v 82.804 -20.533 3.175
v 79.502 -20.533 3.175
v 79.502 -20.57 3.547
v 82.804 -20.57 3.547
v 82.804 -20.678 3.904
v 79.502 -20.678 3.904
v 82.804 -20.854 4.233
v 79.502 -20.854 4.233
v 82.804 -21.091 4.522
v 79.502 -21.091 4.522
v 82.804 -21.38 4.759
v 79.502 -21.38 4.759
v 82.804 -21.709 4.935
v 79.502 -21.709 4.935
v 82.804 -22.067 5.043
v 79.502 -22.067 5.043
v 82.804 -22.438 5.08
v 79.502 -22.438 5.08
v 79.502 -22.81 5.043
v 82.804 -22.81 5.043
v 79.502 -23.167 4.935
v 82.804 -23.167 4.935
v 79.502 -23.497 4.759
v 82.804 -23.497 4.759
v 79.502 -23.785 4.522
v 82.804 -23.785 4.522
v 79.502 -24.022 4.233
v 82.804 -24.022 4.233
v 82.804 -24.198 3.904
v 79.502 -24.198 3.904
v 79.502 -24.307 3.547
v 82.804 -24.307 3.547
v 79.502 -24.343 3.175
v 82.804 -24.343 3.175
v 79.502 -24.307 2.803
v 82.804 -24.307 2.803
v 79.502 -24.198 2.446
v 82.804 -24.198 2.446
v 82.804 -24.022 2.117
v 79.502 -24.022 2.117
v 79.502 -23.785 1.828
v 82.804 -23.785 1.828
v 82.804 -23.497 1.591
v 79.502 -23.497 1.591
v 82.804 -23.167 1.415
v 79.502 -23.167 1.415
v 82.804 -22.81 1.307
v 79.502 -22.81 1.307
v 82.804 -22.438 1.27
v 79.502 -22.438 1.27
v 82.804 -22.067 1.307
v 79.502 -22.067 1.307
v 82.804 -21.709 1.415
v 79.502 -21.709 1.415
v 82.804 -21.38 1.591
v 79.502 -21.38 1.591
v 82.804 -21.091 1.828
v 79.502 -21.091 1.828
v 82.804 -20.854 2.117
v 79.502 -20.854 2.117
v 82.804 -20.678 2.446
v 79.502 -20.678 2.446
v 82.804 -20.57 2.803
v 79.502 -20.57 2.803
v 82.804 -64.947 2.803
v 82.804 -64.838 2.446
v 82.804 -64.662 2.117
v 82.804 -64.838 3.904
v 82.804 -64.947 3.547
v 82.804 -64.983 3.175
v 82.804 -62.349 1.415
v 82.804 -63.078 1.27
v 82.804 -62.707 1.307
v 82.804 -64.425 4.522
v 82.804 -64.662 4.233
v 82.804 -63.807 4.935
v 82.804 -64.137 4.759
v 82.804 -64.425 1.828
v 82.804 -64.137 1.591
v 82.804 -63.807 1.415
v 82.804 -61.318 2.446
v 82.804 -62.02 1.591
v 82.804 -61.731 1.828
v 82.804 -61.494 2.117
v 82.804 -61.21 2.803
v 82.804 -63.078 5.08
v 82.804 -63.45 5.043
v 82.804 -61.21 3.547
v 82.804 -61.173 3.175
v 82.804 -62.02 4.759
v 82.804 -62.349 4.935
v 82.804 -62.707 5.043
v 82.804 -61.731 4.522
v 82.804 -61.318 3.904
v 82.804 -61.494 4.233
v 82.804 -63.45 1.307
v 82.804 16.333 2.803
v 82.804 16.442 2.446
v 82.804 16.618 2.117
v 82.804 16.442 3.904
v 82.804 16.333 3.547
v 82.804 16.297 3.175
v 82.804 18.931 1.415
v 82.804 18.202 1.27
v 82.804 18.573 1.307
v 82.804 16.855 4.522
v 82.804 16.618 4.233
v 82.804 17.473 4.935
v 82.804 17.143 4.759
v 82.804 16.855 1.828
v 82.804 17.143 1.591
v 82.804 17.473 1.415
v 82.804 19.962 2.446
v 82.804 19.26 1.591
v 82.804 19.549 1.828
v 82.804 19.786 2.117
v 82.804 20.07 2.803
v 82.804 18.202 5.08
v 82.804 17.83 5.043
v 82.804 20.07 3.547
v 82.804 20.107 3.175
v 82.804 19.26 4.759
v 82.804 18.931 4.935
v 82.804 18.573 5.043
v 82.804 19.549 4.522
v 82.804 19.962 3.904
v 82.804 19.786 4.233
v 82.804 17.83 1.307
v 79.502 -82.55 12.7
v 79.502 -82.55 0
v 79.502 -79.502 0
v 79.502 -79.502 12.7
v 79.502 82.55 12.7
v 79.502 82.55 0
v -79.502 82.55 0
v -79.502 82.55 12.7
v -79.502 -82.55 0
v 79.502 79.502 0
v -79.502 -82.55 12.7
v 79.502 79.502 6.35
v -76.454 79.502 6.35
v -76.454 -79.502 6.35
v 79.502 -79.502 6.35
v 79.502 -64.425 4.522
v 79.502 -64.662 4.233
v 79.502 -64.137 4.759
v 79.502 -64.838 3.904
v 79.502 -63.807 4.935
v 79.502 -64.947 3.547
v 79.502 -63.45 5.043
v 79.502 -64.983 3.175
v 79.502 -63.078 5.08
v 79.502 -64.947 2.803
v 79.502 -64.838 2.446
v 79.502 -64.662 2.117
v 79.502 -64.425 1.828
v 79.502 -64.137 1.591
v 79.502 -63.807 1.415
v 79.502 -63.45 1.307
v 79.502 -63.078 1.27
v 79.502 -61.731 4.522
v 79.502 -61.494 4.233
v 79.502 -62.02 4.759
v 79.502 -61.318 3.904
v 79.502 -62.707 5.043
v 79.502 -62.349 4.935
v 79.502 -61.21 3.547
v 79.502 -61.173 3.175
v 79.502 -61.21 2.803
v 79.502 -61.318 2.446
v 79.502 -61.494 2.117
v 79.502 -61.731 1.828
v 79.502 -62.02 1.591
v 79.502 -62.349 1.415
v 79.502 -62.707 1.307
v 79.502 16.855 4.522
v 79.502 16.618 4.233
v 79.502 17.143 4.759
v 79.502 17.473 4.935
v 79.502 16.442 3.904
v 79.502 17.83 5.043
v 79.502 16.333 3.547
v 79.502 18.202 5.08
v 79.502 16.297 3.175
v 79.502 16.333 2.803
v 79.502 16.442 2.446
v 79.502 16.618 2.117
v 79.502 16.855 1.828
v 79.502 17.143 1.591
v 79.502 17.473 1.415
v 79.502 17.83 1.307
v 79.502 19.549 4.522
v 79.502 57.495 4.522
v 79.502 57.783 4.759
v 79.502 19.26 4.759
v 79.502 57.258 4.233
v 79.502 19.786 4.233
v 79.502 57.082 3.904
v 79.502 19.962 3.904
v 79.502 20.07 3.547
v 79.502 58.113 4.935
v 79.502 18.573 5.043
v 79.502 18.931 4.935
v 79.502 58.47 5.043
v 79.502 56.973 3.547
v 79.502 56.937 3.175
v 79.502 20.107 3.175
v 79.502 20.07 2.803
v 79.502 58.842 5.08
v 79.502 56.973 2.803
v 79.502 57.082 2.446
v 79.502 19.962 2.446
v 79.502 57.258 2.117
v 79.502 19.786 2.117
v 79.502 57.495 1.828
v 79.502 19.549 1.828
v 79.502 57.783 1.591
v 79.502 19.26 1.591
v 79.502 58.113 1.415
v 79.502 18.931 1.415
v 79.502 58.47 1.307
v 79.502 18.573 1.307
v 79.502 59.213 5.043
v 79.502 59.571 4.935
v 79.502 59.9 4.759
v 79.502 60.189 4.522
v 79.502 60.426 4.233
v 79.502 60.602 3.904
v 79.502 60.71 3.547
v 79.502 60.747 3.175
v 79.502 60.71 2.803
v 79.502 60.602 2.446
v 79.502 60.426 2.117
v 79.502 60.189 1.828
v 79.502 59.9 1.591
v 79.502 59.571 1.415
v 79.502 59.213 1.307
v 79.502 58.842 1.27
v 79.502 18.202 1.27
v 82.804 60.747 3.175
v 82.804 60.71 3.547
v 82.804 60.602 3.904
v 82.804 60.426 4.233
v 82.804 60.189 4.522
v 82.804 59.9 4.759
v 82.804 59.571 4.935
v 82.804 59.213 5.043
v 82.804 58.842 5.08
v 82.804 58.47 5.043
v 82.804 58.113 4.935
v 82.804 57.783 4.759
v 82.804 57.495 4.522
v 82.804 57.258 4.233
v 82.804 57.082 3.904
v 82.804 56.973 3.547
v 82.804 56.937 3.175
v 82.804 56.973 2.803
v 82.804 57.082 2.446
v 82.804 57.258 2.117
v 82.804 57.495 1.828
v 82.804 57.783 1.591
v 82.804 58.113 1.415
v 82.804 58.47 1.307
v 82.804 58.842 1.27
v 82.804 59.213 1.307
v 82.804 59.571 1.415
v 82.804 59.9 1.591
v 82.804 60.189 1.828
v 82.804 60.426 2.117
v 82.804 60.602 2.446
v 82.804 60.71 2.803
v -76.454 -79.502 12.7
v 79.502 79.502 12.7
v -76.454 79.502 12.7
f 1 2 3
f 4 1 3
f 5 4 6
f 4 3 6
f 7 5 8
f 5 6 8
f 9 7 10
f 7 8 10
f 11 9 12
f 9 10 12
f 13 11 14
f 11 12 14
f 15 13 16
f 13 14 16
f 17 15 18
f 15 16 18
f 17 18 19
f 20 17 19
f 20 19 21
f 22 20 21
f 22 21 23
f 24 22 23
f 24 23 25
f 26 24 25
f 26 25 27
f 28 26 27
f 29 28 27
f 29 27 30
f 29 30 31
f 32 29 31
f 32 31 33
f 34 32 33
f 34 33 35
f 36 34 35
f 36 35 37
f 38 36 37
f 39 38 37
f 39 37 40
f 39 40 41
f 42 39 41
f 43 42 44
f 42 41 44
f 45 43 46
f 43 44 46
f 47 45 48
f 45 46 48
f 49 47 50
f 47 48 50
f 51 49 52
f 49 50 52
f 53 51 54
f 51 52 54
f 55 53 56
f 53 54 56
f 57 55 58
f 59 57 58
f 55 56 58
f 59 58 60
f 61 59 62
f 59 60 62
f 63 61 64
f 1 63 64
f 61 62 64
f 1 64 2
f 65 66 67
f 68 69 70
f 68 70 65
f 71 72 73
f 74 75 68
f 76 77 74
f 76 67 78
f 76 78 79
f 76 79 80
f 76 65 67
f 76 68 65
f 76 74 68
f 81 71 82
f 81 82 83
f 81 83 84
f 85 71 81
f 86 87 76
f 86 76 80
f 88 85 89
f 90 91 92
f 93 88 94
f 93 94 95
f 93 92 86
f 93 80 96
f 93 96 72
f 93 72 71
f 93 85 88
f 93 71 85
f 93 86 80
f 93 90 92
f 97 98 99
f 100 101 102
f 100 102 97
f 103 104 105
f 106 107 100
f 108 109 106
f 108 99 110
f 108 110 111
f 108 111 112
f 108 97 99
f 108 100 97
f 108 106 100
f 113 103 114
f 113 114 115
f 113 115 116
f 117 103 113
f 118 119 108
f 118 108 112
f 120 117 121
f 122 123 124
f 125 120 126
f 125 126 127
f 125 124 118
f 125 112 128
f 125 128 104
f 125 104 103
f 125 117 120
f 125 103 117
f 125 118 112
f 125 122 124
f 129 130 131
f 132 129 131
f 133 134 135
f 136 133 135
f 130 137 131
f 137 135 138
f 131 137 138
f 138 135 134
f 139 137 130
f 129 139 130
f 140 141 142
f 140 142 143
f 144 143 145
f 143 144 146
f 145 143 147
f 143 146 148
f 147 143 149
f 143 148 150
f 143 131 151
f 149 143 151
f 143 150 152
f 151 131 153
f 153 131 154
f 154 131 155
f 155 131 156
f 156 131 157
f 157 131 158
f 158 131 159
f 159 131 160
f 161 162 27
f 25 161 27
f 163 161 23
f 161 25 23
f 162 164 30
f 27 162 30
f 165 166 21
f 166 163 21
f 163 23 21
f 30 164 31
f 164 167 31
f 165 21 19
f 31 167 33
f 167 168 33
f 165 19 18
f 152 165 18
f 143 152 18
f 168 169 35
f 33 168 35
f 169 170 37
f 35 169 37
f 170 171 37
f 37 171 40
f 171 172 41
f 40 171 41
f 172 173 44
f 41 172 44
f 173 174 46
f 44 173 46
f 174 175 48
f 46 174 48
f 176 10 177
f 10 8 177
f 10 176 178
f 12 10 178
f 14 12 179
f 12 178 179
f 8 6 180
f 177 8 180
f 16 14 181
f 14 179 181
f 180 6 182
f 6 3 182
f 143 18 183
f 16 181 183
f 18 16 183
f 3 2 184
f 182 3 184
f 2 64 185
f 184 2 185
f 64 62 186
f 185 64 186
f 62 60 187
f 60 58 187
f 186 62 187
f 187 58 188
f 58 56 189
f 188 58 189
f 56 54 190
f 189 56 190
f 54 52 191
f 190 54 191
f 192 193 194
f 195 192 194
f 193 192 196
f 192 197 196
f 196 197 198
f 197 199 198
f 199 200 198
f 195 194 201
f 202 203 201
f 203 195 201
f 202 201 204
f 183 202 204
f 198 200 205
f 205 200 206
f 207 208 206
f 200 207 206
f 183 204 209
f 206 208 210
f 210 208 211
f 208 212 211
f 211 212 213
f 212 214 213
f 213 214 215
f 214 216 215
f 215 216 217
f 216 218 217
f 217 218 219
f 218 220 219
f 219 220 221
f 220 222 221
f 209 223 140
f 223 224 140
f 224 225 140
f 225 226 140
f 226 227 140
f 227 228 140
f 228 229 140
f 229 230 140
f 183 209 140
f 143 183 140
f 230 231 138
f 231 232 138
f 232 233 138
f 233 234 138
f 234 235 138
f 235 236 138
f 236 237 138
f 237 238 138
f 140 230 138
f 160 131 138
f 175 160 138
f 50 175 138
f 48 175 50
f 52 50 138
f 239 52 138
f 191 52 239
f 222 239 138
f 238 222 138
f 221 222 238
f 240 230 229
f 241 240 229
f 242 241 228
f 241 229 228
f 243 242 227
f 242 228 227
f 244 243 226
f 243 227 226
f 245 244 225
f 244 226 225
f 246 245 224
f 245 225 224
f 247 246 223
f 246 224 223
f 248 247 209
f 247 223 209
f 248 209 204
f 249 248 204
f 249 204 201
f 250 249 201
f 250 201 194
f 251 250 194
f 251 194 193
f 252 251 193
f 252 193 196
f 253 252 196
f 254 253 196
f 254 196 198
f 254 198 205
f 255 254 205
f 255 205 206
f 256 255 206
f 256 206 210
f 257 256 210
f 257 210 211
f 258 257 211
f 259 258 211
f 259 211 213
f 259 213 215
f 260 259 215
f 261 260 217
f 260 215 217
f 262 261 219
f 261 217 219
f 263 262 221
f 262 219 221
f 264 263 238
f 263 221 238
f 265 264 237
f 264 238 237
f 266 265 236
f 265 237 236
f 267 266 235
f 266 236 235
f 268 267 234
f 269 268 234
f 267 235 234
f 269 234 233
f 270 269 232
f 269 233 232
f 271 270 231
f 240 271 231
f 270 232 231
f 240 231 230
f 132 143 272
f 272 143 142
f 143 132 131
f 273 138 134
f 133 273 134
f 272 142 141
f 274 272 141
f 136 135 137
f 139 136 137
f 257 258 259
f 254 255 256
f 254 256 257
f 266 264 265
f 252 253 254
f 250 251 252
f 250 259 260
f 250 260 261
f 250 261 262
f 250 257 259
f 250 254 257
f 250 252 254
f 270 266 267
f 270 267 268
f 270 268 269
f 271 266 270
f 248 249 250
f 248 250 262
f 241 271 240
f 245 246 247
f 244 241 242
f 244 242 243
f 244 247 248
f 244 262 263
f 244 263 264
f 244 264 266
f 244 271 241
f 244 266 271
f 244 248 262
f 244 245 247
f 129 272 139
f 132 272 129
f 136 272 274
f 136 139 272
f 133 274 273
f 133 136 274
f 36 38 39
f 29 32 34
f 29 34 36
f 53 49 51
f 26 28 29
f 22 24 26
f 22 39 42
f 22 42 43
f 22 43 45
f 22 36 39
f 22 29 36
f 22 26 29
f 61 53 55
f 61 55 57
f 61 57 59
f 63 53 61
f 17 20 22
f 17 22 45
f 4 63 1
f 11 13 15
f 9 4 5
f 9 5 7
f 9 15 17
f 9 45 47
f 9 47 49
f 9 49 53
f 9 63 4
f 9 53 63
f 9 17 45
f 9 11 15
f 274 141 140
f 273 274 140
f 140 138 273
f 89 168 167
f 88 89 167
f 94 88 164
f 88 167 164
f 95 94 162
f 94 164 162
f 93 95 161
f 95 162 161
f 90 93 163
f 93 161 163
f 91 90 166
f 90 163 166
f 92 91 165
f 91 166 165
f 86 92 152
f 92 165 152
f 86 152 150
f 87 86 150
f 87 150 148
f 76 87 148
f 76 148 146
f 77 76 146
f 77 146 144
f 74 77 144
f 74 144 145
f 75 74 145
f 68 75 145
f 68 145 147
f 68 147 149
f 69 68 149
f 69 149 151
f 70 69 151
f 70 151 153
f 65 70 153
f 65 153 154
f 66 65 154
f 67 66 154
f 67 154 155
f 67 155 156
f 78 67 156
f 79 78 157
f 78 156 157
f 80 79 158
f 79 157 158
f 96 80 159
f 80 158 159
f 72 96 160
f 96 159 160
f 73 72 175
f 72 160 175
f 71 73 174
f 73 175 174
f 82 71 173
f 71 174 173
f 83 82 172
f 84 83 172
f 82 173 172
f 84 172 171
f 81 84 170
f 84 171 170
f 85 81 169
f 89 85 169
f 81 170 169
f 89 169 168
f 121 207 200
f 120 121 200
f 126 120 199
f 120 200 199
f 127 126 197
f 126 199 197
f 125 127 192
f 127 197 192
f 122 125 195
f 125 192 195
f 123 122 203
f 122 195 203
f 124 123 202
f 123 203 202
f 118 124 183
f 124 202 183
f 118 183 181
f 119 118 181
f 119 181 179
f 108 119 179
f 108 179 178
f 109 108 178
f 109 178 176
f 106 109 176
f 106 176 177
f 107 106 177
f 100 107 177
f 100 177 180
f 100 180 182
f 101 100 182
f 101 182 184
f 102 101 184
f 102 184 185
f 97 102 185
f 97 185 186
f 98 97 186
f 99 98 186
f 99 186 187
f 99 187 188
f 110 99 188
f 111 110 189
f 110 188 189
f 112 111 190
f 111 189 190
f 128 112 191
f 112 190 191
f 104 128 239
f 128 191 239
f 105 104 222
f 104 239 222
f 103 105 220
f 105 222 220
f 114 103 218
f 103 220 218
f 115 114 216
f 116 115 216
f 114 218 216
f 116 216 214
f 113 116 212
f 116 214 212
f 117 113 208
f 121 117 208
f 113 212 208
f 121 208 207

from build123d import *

# Parameters (mm, degrees)
F0_W     = 152.908
F0_H     = 159.004
F1_DEPTH = 6.35
F2_DEPTH = 12.7
F3_R     = 1.905
F4_DEPTH = 6.35
F0_W_2   = 3.047997
F5_DEPTH = 6.35


with BuildPart() as f1:
    # F0 (on Top) → F1 (new body)
    with BuildSketch(Plane.XY):
        Rectangle(F0_W, F0_H)
    extrude(amount=F1_DEPTH)

    # F0 (on Top) → F2 (join)
    with BuildSketch(Plane.XY):
        Polygon((79.501997, -79.502), (76.454, -79.502), (-76.454, -79.502), (-76.454, 79.502), (76.454, 79.502), (79.501997, 79.502), (79.501997, 82.549997), (-79.501997, 82.549997), (-79.501997, -82.549997), (79.501997, -82.549997), align=None)
    extrude(amount=F2_DEPTH)

    # F3 (on face) → F4 (join)
    with BuildSketch(Plane.YZ.offset(76.454)):
        with Locations((-63.078232, 3.175)):
            Circle(F3_R)
        with Locations((-22.438232, 3.175)):
            Circle(F3_R)
        with Locations((18.201768, 3.175)):
            Circle(F3_R)
        with Locations((58.841768, 3.175)):
            Circle(F3_R)
    extrude(amount=F4_DEPTH)

    # F0 (on Top) → F5 (join)
    with BuildSketch(Plane.XY):
        with Locations((77.977998, 0)):
            Rectangle(F0_W_2, F0_H)
    extrude(amount=F5_DEPTH)


solid = f1.part
